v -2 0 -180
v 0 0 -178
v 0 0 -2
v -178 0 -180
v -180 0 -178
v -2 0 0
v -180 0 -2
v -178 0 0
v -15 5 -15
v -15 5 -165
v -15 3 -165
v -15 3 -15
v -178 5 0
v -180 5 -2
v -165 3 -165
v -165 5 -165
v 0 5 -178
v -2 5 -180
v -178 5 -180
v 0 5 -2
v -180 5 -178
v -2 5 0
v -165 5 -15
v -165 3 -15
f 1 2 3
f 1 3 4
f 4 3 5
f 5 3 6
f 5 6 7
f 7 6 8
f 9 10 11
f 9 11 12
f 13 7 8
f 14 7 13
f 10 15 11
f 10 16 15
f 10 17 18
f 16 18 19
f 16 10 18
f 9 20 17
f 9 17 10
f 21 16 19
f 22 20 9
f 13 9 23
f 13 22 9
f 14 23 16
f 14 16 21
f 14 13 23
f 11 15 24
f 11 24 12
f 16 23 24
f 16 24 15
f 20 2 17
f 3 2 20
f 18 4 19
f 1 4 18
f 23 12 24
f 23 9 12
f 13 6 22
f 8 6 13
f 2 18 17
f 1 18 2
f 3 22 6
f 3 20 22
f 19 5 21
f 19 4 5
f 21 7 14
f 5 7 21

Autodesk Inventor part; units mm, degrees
ref_plane "YZ Plane" through (0, 0, 0) normal (1, 0, 0) x (0, 1, 0)
ref_plane "XZ Plane" through (0, 0, 0) normal (0, 1, 0) x (-1, 0, 0)
ref_plane "XY Plane" through (0, 0, 0) normal (0, 0, 1) x (1, 0, 0)
sketch "Sketch1" plane through (0, 0, 0) normal (0, 1, 0) x (-1, 0, 0)
  line L0 (0, 0) -> (180, 0)
  line L1 (180, 0) -> (180, -180)
  line L2 (180, -180) -> (0, -180)
  line L3 (0, -180) -> (0, 0)
  dimension "d0" = 180
  dimension "d1" = 180
extrude "Extrusion1" add sketch "Sketch1" along normal blind 5
sketch "Sketch2" plane through (0, 5, 0) normal (0, 1, 0) x (1, 0, 0)
  line L0 (-165, 165) -> (-15, 165)
  line L1 (-15, 165) -> (-15, 15)
  line L2 (-15, 15) -> (-165, 15)
  line L3 (-165, 15) -> (-165, 165)
  line L4 (-180, 180) -> (-180, 0) projected
  point P0 (0, 0)
  dimension "d4" = 150
  dimension "d5" = 150
  dimension "d6" = 15
  dimension "d7" = 15
extrude "Extrusion2" cut sketch "Sketch2" against normal blind 2
chamfer "Chamfer1" distance 2 angle 45 4 edges at (-180, 2.5, 0) (-180, 2.5, -180) (0, 2.5, -180) (0, 2.5, 0)
properties part number "MouldBase20"
